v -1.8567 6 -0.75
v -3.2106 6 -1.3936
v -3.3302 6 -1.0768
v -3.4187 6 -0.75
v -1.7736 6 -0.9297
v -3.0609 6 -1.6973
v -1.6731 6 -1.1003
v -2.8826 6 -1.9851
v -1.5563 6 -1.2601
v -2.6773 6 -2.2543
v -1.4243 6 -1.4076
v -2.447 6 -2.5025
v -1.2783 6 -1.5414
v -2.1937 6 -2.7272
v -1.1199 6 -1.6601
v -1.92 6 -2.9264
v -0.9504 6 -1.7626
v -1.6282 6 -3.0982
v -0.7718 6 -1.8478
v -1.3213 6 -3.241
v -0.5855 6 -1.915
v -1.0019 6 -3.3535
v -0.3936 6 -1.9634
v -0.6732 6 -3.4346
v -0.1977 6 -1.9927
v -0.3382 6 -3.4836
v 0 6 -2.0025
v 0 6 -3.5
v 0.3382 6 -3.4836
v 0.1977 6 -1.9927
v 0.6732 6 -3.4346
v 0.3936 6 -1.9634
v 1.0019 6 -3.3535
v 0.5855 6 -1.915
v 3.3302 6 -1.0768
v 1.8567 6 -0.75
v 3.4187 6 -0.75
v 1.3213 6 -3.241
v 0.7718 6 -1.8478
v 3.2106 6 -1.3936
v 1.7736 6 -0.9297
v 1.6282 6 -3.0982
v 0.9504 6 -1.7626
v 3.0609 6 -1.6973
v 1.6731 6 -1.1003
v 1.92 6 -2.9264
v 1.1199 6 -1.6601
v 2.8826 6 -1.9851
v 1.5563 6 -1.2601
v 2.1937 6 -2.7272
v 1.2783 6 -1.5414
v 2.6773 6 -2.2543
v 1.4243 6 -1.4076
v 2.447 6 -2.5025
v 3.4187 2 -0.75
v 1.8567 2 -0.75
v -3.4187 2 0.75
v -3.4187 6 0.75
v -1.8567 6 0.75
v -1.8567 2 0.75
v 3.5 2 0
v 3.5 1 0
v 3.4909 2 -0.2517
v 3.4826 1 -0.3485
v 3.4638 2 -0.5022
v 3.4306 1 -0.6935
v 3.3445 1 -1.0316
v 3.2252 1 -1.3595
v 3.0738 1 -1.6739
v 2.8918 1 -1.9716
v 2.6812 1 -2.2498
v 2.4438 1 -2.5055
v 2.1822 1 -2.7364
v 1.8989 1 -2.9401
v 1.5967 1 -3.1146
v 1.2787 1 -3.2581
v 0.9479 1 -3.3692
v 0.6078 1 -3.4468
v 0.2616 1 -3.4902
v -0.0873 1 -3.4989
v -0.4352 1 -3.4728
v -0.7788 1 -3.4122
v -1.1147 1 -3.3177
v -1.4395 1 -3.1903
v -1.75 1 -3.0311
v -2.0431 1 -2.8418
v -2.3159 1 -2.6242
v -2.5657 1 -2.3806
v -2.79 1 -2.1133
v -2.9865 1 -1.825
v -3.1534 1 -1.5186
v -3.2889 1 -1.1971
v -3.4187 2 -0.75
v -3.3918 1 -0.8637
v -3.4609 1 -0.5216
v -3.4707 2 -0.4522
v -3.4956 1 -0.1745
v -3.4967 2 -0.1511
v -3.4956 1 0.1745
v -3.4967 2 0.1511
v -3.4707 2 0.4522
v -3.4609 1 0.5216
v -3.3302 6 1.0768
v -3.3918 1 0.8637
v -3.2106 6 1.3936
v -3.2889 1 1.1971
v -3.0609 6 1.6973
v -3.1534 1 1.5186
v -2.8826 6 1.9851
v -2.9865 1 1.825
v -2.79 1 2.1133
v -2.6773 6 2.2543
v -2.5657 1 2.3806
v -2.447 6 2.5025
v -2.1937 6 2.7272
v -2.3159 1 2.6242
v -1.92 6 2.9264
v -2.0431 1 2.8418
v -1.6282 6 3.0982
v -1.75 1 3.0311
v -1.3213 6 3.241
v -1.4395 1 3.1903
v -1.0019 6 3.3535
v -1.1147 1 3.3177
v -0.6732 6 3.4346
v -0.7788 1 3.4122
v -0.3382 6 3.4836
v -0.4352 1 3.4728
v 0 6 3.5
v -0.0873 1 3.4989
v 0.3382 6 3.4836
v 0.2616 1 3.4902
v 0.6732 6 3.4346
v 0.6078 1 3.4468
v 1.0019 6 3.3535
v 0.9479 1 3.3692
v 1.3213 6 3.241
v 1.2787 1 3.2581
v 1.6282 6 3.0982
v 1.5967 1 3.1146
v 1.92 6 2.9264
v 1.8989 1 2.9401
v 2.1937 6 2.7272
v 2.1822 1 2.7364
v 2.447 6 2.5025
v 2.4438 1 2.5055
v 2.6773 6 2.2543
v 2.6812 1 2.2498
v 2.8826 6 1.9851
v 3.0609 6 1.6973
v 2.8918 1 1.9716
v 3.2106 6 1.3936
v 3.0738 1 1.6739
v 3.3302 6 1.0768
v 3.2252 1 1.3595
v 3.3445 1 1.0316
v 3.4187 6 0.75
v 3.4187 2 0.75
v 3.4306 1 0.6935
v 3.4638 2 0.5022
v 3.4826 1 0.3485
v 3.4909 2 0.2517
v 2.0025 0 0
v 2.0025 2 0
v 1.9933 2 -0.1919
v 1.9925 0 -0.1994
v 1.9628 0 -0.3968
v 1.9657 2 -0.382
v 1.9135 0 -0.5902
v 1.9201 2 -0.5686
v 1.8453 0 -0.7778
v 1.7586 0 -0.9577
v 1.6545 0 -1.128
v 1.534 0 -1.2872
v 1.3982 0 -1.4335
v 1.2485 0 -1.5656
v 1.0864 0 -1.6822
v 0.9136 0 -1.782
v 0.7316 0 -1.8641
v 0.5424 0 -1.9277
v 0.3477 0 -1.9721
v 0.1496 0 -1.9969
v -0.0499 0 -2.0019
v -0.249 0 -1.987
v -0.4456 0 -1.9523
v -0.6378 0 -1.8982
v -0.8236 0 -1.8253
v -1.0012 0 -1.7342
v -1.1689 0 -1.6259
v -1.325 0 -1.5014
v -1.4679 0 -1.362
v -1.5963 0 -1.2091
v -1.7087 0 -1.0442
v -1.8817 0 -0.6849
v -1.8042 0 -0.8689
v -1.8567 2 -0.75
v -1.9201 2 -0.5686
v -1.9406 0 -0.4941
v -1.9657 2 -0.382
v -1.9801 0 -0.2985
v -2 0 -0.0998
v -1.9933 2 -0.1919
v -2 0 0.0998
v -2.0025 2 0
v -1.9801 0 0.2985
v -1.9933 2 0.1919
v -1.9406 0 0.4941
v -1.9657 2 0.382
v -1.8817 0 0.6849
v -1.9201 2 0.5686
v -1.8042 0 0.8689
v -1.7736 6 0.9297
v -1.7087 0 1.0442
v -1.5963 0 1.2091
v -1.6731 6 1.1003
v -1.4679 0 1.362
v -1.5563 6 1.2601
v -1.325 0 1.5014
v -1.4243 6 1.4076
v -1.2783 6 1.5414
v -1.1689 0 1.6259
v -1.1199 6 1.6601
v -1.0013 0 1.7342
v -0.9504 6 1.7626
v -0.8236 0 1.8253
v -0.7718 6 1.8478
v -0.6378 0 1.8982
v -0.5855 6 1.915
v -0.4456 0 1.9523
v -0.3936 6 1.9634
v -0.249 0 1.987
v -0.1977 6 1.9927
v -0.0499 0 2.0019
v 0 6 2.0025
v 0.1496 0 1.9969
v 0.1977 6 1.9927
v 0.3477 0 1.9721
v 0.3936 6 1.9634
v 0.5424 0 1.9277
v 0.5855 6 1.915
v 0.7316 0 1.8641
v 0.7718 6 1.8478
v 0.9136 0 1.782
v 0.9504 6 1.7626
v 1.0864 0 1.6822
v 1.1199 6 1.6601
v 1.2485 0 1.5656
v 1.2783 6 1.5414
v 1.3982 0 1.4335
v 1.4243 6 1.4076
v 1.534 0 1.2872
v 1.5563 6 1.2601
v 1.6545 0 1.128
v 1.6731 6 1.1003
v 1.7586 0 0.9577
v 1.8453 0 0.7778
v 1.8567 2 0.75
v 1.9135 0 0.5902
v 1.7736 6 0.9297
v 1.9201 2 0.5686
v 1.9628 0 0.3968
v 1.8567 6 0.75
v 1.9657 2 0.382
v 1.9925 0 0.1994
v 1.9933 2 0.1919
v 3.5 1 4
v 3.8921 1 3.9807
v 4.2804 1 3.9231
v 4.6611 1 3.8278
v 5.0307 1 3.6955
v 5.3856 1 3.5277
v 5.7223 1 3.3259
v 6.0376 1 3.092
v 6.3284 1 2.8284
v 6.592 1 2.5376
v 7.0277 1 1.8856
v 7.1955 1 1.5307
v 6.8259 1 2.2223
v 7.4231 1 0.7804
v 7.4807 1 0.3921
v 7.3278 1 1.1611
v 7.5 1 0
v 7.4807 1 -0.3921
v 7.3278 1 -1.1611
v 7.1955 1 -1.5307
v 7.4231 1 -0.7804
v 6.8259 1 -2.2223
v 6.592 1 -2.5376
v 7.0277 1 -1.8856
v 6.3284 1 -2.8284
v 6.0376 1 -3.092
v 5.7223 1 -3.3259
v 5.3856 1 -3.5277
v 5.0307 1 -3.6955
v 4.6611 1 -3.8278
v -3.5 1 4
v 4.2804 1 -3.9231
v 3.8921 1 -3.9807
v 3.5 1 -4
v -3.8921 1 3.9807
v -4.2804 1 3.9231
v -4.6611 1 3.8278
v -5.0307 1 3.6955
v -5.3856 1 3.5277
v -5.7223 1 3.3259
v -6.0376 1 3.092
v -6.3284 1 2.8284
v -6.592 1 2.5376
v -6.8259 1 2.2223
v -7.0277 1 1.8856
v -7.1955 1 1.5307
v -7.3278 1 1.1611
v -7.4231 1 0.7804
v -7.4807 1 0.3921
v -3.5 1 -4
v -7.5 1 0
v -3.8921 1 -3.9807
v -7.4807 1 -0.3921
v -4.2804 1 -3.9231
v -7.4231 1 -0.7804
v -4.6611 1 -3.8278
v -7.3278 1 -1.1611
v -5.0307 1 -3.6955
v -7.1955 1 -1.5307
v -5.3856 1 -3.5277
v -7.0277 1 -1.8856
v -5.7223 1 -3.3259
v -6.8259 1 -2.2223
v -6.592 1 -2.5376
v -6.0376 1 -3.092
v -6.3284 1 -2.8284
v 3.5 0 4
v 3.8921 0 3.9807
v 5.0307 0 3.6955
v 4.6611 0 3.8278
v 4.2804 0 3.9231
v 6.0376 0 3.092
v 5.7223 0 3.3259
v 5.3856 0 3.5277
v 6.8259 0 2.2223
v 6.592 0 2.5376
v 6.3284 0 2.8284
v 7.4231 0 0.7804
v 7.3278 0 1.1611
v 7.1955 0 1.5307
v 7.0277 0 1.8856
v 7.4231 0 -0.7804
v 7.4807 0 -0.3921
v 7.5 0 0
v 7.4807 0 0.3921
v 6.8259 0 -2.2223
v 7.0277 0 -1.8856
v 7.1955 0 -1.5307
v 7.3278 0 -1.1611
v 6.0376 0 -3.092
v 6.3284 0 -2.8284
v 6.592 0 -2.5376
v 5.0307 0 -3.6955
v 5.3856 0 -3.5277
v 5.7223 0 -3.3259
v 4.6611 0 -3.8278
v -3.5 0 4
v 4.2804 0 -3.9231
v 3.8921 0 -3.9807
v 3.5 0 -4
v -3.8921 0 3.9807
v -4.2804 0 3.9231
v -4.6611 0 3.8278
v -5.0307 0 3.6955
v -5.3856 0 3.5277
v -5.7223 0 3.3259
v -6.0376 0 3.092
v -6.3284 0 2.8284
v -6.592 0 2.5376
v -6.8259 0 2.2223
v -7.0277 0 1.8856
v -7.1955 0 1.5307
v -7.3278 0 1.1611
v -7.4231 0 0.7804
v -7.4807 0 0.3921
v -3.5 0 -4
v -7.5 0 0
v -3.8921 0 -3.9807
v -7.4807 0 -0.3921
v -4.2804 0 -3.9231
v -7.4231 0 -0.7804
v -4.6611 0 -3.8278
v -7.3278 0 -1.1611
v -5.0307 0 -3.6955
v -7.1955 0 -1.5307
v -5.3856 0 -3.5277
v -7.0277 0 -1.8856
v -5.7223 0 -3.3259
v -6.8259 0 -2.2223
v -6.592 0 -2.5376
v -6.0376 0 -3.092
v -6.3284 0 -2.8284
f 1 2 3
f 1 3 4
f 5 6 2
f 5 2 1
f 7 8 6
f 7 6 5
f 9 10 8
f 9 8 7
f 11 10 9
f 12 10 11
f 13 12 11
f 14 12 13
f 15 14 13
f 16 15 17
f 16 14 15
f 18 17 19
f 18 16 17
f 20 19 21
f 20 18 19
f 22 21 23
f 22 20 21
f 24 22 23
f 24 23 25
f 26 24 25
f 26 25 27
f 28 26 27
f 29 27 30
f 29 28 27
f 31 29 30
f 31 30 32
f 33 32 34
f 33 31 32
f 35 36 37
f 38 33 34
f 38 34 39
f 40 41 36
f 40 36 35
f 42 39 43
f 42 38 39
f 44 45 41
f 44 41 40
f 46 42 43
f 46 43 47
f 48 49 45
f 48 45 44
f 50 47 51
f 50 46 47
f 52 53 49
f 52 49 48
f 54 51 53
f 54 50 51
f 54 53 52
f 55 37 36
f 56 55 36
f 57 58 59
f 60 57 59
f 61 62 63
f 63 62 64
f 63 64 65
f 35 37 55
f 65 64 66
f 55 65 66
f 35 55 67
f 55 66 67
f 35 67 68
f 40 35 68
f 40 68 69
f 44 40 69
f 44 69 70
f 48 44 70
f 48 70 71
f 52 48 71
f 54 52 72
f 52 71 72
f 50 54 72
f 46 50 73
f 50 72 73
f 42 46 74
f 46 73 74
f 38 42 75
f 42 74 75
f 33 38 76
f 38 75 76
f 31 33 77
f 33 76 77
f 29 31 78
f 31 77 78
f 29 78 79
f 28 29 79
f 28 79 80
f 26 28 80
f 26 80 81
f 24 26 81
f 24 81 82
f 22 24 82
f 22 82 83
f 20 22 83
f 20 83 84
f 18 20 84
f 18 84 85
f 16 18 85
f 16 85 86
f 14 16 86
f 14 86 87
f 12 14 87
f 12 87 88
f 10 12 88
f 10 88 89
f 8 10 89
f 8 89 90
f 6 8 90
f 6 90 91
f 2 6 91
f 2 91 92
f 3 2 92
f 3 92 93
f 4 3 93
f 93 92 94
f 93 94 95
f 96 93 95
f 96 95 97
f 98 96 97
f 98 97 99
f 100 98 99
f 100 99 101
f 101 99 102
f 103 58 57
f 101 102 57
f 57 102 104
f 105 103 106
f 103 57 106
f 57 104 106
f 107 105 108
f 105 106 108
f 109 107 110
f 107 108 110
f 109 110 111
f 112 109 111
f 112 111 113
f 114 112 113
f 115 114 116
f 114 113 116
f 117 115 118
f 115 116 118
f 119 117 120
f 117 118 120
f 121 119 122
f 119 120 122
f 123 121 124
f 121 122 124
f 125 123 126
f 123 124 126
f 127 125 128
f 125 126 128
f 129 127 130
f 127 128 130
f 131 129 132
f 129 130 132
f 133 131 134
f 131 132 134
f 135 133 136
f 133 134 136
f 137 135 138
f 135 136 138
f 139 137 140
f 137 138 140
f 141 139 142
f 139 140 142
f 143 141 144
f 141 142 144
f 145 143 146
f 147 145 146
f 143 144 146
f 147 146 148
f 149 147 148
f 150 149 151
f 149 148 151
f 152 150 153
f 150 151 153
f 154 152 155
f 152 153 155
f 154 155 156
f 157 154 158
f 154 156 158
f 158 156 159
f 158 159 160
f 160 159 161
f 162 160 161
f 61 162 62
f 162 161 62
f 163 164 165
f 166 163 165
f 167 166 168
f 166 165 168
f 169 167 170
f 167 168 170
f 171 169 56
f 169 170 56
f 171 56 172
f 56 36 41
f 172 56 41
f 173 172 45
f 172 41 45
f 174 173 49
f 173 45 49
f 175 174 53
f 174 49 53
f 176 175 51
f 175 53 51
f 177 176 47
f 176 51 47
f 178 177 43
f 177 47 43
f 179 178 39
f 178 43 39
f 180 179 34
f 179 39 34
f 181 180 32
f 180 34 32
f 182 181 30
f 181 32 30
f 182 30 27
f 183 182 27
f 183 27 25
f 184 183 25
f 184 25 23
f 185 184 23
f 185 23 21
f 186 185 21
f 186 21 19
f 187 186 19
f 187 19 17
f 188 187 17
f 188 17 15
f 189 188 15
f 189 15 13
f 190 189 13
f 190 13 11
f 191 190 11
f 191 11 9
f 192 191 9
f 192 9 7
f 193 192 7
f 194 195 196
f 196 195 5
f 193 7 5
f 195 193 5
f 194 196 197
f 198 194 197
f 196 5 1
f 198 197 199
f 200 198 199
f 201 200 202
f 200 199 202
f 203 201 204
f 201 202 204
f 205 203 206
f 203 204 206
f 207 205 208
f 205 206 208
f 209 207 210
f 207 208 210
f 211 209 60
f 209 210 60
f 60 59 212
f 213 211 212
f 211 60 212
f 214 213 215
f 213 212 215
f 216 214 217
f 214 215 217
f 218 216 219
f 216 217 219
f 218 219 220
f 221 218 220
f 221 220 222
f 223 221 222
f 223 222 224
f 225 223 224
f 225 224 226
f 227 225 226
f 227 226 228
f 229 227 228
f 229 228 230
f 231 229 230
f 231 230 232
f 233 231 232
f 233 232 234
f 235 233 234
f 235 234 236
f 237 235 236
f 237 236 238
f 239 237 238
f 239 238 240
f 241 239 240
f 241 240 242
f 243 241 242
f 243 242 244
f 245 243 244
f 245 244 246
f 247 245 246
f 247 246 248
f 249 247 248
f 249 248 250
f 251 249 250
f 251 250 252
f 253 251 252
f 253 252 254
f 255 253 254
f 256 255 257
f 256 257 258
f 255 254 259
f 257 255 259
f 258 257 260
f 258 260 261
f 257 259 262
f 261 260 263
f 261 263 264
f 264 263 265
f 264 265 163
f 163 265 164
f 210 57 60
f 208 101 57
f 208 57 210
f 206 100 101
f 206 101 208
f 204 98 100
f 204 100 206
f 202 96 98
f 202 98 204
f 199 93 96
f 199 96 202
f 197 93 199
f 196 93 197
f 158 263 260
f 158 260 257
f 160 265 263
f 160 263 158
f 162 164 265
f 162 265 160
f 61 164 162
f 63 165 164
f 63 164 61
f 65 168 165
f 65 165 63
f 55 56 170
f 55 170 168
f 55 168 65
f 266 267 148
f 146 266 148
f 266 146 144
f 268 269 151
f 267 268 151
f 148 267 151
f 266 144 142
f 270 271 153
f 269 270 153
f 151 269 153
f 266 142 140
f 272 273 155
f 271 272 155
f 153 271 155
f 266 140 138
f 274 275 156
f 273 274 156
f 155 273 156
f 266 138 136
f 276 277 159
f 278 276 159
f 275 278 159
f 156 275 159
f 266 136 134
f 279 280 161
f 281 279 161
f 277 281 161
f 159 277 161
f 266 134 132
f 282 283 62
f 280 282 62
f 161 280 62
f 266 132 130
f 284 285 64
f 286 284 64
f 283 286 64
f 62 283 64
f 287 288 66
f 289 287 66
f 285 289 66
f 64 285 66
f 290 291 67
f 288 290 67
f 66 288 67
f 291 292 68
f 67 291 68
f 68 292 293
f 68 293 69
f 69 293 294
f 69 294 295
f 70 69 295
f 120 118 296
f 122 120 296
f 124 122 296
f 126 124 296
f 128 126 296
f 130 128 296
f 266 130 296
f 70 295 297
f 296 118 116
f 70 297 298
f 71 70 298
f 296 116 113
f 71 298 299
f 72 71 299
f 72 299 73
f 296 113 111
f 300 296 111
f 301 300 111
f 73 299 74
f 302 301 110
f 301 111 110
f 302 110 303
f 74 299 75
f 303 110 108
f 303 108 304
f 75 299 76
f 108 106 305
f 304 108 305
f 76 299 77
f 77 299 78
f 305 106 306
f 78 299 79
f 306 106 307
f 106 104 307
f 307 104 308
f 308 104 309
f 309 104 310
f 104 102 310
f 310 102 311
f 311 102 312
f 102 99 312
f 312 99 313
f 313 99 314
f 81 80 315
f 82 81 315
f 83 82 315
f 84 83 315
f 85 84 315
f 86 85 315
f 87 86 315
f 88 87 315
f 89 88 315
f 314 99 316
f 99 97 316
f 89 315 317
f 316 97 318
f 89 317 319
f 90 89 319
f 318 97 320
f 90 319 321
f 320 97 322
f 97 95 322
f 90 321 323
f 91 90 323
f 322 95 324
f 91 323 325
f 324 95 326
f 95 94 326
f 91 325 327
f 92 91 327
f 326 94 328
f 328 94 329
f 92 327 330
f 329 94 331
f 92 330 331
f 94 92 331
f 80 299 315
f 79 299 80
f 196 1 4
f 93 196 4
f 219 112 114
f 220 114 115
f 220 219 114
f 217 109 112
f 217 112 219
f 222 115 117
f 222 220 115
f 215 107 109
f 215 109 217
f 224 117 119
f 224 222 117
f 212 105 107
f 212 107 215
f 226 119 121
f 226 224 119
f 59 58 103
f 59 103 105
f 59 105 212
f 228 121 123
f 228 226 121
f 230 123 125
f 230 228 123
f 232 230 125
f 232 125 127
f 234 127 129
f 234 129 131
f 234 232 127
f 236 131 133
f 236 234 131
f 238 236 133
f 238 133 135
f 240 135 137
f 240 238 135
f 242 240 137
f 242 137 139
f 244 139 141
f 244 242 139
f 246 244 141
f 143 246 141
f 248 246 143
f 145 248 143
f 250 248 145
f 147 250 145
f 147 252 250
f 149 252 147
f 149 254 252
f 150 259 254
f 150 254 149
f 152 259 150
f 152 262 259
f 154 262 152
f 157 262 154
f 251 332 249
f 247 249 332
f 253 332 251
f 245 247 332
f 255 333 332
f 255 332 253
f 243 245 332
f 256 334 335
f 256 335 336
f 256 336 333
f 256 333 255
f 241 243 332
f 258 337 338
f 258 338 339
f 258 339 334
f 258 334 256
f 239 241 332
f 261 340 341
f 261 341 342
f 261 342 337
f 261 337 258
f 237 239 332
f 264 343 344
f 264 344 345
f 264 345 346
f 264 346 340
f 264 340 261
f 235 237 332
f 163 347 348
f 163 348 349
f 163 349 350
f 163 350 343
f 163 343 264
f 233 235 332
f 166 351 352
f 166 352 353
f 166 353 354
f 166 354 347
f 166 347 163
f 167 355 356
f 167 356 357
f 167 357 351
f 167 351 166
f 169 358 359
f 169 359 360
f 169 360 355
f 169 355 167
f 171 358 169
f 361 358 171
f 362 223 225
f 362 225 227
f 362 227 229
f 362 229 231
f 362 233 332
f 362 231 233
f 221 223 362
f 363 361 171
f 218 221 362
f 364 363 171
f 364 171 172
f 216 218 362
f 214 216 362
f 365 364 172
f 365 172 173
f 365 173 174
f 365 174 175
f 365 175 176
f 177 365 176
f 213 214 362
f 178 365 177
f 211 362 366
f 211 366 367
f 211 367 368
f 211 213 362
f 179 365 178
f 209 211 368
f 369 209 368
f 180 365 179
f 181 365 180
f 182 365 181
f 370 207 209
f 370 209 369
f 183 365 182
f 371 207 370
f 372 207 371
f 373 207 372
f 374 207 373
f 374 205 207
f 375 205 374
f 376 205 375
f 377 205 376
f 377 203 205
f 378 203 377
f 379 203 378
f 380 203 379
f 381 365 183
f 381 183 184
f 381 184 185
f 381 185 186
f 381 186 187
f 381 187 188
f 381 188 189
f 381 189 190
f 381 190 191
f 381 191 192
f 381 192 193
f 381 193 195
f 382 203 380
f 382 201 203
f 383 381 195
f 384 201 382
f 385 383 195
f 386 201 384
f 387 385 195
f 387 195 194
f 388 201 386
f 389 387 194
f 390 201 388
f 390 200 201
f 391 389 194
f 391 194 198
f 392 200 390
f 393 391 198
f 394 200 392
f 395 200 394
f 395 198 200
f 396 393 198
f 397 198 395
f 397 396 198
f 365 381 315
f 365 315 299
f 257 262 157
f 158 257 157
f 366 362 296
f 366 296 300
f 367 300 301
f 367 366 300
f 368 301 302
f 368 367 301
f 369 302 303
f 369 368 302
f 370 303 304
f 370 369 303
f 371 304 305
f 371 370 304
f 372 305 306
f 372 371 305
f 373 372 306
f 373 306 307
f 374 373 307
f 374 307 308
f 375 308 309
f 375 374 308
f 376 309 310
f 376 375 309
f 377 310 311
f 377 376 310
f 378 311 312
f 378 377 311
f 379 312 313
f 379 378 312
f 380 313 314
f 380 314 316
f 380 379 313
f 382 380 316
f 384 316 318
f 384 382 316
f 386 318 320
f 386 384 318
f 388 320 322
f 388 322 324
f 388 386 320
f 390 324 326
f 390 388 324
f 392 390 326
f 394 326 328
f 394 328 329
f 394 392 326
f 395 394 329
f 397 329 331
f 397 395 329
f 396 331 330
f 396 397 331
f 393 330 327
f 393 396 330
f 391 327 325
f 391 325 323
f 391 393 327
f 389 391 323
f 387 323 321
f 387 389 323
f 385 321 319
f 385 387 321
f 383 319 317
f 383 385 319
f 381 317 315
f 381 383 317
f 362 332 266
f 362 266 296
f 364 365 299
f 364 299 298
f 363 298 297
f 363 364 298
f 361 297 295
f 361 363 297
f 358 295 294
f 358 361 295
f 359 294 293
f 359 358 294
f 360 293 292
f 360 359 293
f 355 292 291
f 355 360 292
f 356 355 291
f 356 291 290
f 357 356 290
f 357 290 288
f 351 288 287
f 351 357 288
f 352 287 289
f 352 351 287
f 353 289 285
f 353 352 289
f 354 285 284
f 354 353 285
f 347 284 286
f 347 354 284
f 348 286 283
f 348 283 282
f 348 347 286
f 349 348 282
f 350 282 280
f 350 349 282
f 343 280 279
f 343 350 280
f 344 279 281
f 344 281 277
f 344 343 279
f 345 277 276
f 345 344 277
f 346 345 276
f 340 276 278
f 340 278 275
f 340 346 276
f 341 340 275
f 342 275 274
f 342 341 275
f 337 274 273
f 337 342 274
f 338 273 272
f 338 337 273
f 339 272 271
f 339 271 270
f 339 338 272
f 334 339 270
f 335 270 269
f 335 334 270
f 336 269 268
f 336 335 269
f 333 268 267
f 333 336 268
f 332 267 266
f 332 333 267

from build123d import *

# Parameters (mm, degrees)
BOSS_EXTRUDE1_DEPTH = 1
SKETCH2_R           = 3.5
BOSS_EXTRUDE2_DEPTH = 5
SKETCH3_R           = 2.0025
CUT_EXTRUDE1_DEPTH  = 7
CUT_EXTRUDE2_DEPTH  = 4


with BuildPart() as part:
    # Sketch1 → Boss-Extrude1 (new body)
    with BuildSketch(Plane(origin=(0, 0, 0), x_dir=(1, 0, 0), z_dir=(0, 1, 0))):
        with BuildLine():
            Line((-3.5, 4), (3.5, 4))
            ThreePointArc((3.5, 4), (7.5, 0), (3.5, -4))
            Line((3.5, -4), (-3.5, -4))
            ThreePointArc((-3.5, -4), (-7.5, 0), (-3.5, 4))
        make_face()
    extrude(amount=BOSS_EXTRUDE1_DEPTH)

    # Sketch2 → Boss-Extrude2 (add)
    with BuildSketch(Plane(origin=(0, 1, 0), x_dir=(1, 0, 0), z_dir=(0, 1, 0))):
        Circle(SKETCH2_R)
    extrude(amount=BOSS_EXTRUDE2_DEPTH)

    # Sketch3 → Cut-Extrude1 (cut, through all)
    with BuildSketch(Plane(origin=(0, 6, 0), x_dir=(1, 0, 0), z_dir=(0, 1, 0))):
        Circle(SKETCH3_R)
    extrude(amount=-CUT_EXTRUDE1_DEPTH, mode=Mode.SUBTRACT)

    # Sketch4 → Cut-Extrude2 (cut)
    with BuildSketch(Plane(origin=(0, 6, 0), x_dir=(1, 0, 0), z_dir=(0, 1, 0))):
        with BuildLine():
            Line((-1.856746146, 0.75), (-3.418698583, 0.75))
            ThreePointArc((-3.418698583, 0.75), (-3.5, 0), (-3.418698583, -0.75))
            Line((-3.418698583, -0.75), (-1.856746146, -0.75))
            ThreePointArc((-1.856746146, -0.75), (-2.0025, 0), (-1.856746146, 0.75))
        make_face()
        with BuildLine():
            ThreePointArc((3.418698583, -0.75), (3.5, 0), (3.418698583, 0.75))
            Line((3.418698583, 0.75), (1.856746146, 0.75))
            ThreePointArc((1.856746146, 0.75), (2.0025, 0), (1.856746146, -0.75))
            Line((1.856746146, -0.75), (3.418698583, -0.75))
        make_face()
    extrude(amount=-CUT_EXTRUDE2_DEPTH, mode=Mode.SUBTRACT)


solid = part.part
